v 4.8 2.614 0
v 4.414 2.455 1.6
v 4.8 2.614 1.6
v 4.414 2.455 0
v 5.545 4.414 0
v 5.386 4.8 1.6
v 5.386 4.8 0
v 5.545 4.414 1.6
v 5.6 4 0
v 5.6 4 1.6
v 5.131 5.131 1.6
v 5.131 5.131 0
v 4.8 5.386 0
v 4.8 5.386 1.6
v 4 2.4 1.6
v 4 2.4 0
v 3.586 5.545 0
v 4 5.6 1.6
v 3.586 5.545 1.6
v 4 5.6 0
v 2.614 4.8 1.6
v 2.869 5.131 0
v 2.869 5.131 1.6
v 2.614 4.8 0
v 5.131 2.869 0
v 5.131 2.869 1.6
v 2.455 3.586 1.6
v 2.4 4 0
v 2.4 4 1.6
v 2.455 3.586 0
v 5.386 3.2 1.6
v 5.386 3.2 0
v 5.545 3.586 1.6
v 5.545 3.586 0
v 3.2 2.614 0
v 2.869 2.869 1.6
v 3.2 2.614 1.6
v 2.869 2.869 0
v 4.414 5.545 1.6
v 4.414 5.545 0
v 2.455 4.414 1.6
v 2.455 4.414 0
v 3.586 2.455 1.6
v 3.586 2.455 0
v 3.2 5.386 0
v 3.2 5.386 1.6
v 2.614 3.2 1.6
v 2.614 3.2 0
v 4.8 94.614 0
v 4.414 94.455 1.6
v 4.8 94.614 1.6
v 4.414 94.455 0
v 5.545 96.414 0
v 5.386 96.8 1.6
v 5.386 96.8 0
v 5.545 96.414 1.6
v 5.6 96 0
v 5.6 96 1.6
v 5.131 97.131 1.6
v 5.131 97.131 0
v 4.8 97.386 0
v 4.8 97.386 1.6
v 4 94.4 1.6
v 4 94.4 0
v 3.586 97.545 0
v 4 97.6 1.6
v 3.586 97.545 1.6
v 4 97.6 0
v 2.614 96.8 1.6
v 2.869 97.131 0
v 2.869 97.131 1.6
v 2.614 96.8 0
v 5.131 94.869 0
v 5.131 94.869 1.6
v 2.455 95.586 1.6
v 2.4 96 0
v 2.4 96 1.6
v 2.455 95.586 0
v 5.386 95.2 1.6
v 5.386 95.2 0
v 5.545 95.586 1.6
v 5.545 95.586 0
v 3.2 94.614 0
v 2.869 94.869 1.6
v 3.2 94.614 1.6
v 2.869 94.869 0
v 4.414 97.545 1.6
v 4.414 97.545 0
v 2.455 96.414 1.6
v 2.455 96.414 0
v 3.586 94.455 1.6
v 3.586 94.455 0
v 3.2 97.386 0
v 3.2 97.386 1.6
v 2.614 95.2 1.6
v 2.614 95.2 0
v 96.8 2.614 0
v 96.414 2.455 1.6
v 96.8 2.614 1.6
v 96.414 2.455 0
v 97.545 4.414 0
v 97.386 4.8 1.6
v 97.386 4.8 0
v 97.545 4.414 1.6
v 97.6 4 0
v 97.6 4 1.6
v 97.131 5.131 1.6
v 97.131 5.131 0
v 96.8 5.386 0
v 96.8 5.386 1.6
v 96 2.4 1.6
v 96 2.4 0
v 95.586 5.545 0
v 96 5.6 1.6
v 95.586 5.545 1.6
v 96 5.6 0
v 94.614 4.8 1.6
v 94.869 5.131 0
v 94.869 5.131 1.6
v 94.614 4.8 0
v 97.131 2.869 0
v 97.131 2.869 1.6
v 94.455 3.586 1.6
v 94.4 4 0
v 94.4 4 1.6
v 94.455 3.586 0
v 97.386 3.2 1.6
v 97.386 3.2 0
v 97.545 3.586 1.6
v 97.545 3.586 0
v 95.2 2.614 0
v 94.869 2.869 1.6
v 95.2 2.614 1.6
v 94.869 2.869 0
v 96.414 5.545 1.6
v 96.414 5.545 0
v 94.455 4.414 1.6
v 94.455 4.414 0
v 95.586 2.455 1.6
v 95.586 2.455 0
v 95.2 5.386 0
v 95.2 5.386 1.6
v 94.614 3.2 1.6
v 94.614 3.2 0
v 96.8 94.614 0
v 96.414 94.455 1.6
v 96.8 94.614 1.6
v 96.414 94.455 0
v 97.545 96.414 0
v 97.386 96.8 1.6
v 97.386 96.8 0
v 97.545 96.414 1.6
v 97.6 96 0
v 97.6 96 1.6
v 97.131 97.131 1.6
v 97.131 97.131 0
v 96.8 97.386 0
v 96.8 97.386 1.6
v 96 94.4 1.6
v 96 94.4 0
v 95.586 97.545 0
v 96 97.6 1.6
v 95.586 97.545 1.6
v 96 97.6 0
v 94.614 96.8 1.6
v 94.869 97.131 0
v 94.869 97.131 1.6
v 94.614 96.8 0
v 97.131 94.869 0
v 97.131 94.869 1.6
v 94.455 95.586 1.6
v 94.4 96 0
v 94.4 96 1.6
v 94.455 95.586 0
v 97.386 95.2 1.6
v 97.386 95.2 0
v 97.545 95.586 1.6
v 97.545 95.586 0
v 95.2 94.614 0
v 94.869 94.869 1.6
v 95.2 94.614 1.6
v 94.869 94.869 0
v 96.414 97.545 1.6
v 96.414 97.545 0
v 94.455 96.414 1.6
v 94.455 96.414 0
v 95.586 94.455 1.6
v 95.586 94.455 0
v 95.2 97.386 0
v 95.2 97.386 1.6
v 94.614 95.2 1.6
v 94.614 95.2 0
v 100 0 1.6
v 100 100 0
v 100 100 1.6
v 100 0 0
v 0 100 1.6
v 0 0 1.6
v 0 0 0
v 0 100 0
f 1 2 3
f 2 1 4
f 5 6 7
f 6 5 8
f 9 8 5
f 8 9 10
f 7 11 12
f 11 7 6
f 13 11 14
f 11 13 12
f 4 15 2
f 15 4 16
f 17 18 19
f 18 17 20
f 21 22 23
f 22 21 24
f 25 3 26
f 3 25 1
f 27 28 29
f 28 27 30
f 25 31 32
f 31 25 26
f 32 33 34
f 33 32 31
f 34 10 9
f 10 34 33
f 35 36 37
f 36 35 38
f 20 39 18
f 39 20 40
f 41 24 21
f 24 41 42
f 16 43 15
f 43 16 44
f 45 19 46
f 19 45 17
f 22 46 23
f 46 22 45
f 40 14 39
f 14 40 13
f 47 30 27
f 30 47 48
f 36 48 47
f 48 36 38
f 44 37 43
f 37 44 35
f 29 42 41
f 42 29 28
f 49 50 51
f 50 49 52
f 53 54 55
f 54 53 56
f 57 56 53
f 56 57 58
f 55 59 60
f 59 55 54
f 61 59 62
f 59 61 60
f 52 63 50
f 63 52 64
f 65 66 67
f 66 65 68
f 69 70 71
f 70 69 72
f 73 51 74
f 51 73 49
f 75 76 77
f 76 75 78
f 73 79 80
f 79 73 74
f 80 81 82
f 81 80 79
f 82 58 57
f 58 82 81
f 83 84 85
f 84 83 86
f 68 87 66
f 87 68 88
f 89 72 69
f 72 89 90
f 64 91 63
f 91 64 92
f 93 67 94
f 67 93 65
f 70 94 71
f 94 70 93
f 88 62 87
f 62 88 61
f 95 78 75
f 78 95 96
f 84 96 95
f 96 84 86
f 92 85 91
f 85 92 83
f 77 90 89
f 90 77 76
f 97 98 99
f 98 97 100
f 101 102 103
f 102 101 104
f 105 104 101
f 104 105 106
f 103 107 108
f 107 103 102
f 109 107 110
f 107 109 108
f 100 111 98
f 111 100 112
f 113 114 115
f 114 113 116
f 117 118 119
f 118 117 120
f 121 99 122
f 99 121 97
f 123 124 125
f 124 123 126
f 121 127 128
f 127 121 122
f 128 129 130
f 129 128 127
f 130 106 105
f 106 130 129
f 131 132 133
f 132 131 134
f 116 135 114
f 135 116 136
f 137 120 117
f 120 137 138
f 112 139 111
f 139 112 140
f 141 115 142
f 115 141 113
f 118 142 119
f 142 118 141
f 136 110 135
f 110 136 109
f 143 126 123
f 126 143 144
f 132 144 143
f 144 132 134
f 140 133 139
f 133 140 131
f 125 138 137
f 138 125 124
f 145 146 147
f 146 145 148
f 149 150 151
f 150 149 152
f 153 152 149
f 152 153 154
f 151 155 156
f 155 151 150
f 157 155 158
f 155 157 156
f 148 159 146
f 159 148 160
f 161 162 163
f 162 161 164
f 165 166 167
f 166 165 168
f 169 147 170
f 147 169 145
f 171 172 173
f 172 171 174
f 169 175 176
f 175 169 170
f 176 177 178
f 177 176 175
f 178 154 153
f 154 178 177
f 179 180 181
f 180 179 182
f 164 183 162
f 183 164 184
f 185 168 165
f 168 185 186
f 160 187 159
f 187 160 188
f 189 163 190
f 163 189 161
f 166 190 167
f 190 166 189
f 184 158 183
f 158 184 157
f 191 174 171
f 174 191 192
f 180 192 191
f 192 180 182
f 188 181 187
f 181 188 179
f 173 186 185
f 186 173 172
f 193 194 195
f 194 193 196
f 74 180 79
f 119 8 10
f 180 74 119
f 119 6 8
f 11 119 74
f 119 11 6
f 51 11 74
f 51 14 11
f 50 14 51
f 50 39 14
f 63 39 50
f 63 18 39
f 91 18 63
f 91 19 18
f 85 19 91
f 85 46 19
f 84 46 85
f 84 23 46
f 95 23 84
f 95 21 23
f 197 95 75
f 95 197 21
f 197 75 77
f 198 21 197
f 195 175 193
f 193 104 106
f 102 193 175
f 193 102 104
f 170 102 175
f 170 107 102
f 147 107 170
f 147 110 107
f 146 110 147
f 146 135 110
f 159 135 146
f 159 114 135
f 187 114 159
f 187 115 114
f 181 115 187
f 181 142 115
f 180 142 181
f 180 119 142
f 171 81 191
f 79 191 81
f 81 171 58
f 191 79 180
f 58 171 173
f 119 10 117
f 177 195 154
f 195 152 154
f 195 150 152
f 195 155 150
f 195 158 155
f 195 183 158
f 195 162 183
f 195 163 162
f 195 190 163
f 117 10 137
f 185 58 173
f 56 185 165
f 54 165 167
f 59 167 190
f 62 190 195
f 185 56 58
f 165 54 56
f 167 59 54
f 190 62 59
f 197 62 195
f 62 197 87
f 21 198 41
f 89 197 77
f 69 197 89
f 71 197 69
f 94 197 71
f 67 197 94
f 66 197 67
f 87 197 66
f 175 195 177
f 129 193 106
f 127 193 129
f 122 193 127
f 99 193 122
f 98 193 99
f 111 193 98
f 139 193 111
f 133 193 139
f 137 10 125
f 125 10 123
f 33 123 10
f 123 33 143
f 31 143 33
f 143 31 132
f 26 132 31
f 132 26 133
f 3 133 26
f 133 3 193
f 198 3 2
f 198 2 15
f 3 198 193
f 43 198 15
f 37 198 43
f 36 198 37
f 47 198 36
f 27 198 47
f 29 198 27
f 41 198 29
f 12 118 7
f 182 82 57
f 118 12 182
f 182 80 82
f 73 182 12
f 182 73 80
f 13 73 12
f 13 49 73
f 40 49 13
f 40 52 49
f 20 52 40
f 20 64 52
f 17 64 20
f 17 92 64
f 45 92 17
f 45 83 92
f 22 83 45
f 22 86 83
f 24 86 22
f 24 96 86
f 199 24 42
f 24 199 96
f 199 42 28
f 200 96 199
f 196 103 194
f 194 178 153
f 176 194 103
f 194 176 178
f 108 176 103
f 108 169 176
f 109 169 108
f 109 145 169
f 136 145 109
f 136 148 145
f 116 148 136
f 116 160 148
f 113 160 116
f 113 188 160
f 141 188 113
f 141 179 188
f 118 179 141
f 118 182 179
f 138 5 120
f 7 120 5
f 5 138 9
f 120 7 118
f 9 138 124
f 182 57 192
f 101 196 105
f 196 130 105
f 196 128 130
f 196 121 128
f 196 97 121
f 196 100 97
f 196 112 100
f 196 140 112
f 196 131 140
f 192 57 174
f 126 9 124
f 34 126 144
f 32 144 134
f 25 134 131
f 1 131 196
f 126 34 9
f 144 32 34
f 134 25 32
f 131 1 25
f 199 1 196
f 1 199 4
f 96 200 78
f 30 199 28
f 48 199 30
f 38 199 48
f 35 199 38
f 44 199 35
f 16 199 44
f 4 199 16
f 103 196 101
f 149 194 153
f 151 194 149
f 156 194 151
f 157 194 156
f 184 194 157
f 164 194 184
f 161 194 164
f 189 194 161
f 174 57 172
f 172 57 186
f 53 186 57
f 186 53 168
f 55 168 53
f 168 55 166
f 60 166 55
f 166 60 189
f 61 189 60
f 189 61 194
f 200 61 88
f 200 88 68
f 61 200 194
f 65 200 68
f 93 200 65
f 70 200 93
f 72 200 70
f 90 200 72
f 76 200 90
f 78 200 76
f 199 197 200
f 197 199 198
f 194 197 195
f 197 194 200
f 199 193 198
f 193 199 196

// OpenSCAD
// =====================================================================
// ROBOT 2 (telepresence robot) - ALL PARAMETERS IN ONE PLACE
// Units: millimetres. Frame: origin on the floor under the centre of the base,
//   +x = front (the way the screen looks), +y = robot LEFT, +z = up.
// Every other .scad file does   include <robot2_params.scad>
// Values marked (V) were seen in a source, (A) are assumptions. See docs/mechanical-design.md.
// To change the robot: edit numbers HERE, then re-export the parts.
// =====================================================================
$fn = 48;
eps = 0.01;

// ---------------------------------------------------------------- BASE (round puck)
base_r      = 130;     // base radius -> 260 mm diameter
z_floor_b   = 12;      // floor underside above ground (ground clearance)
floor_t     = 3;       // floor thickness
z_floor_t   = z_floor_b + floor_t;   // 15 = top of floor
z_deck_b    = 68;      // deck underside = top of the tray rim (wheel top is 65)
deck_t      = 4;       // deck thickness
z_deck_t    = z_deck_b + deck_t;     // 72
cover_wall  = 2.0;     // cover skirt thickness
cover_top_t = 2.4;     // cover top plate thickness
z_cover_top = 105;     // top of cover
rim_t       = 2.0;     // tray rim wall

// split lines for printing the big discs in 4 pieces (any bed >= 180 mm)
cut_x = -40;           // front/rear split (rear pieces are x < cut_x)
cut_y = 0;             // left/right split
tab_clear = 0.25;      // dovetail clearance (female is bigger by this)

// ---------------------------------------------------------------- WHEELS, MOTORS, CASTER
wheel_d     = 65;      // PARAMETER: drive wheel diameter
wheel_w     = 26;      // wheel width (A)
wheel_r     = wheel_d/2;
axle_x      = 0;       // drive axle position
wheel_y     = 117;     // wheel centre plane (|y|) -> outer face at 130
wheel_gap   = 1.5;
motor_d     = 25;      // gearmotor body diameter (Pololu 25D / 25GA370 class)
motor_len   = 52;      // body incl. gearbox (V Pololu 25Dx52L)
motor_face_y= wheel_y - wheel_w/2 - 2.5 - 0.5; // gearbox face |y| = 101 (wall is behind it)
motor_shaft_d = 4;     // D-shaft (V Pololu 25D)
motor_shaft_len = 12;
well_wall_y = 101.2;   // inner wall of wheel well, |y| start
well_wall_t = 1.6;
caster_x    = 104;     // ball caster centre
caster_ball = 16;      // steel ball diameter (A: common 16 mm bearing ball)
caster_flange_d = 38;
caster_cup_d    = 28;
skid_pos    = [[95, 58], [95, -58], [-85, 85], [-85, -85]];   // 4 anti-tip skids (front-side and rear-side corners)
skid_gap    = 1.5;     // skid height above floor when level (was 4 mm; with 1.5 mm they touch after about 1 degree tilting backwards and about 2.7 degrees tilting forwards/sideways; they scrape door thresholds and thick carpet)

// ---------------------------------------------------------------- MOTHERBOARD (V: 100x100, holes 4/96 mm)
mb_size   = 100;
mb_hole   = 4;         // hole offset from board edge
mb_x0     = 14;        // robot x of the board's BOTTOM edge (servo plugs face front, +x)
mb_y0     = -88;       // robot y of the board's LEFT edge (power terminals face the robot's right)
mb_stand  = 6;         // standoff height above deck
mb_pcb_t  = 1.6;
mb_tall   = 20;        // tallest part above the PCB, bare (A: ESP32 on sockets ~15, PCA9685 module with its bare header strip ~19, DRV8833 on sockets ~17, 470 uF cap ~13). Servo PLUGS ARE NOT INCLUDED here: see PCA9685 SERVO-PLUG RELIEF below.
// board (bx,by) -> robot (x,y):  x = mb_x0 - by ;  y = mb_y0 + bx   (board turned 90 deg)
function mb_xy(bx,by) = [mb_x0 - by, mb_y0 + bx];

// ---------------------------------------------------------------- PCA9685 SERVO-PLUG RELIEF (window in the cover + printed plug_hood)
// A servo plug on the PCA9685 header is taller than the 3 mm of free space under the cover (cover underside 102.6, bare header top 98.7).
// With the assumed plug (14 mm) the plug top is at 106.2 and the wires need another 8 mm to bend away, so the cover gets a window and a hood.
// plug_relief = false: no window and no hood (use right-angle servo plugs, about 6 mm high, or MEASURE your plugs first).
plug_relief   = true;
plug_h        = 14;    // (A) height of a 3-pin servo plug housing on the 2.54 mm header (typical Dupont / JR size). MEASURE YOUR PLUG, then change this number.
plug_bend     = 8;     // (A) extra room above the plug so the wires can turn sideways
hdr_plastic_h = 2.5;   // (A) black plastic base of the header (the plug sits on it)
pca_top_h     = 10.1;  // PCA9685 board top above the motherboard top face (from robot2_ghosts.scad, mb_pca)
mb_top_z      = z_deck_t + mb_stand + mb_pcb_t;                 // 79.6 top face of the motherboard
plug_top_z    = mb_top_z + pca_top_h + hdr_plastic_h + plug_h;  // 106.2 top of the plug housings
cover_in_z    = z_cover_top - cover_top_t;                      // 102.6 underside of the cover top plate
relief_h      = max(0, ceil(plug_top_z + plug_bend - cover_in_z));   // 12 mm of extra headroom above the cover underside (computed)
// window (robot frame): the header strip (board bx 11..74, by 2..8) plus 3 mm either side, and 15 mm toward the mast for the wires
relief_p0 = mb_xy(8, 13);     // corner 1 = [1, -80]
relief_p1 = mb_xy(77, -10);   // corner 2 = [24, -11]
relief_cx = (relief_p0[0] + relief_p1[0]) / 2;   relief_cy = (relief_p0[1] + relief_p1[1]) / 2;     // window centre = [12.5, -45.5]
relief_wx = abs(relief_p1[0] - relief_p0[0]);    relief_wy = abs(relief_p1[1] - relief_p0[1]);      // window size = 23 x 69
hood_wall = 2;  hood_top_t = 2;  hood_fl_w = 4;  hood_fl_t = 1.6;     // plug_hood (base.scad): wall, top thickness, flange width, flange thickness
hood_h_in = relief_h - cover_top_t;                                    // 9.6 inside height above the cover top face
hood_top_z = z_cover_top + hood_h_in + hood_top_t;                     // 116.6 top of the hood (outside), robot frame

// ---------------------------------------------------------------- COVER TOP: BUTTON, SPEAKER, SPEAKERPHONE  (R23, open item C5; sizes from docs/peripherals.md 5.6)
// Positions are on the cover top, robot frame. Each place is kept clear of the mast cut-out (x 38..86, |y| < 30), the plug hood (x -5..30, y -86..-5), the cover posts, the vents and each other.
// The cover prints top face DOWN, so the speaker pocket (a ring that hangs under the top plate) stands up from the bed and needs no support.
btn_hole_d = 30;                 // call / STOP button: round hole in the cover top (A: MEASURE your button; many 30 mm arcade buttons need a 28 to 30 mm hole and a plate of 2 to 3 mm)
btn_pos    = [62, 60];           // robot LEFT of the mast. Under it: 30 mm free down to the deck (the button needs about 25 mm), the foot plate ends at |y| = 42, the button body starts at |y| = 46
btn_depth  = 25;                 // (A, peripherals 5.6) free depth needed behind the panel
btn_body_d = 28;  btn_cap_d = 33;  btn_cap_h = 9;   // (A) ghost only: body behind the panel, cap above the panel
spk_place    = true;             // route B speaker place (grille + pocket) in the cover top. false = plain cover top
spk_pos      = [56, -60];        // robot RIGHT of the mast. The speaker faces UP; the microphone is in the head, 0.4 m higher
spk_grille_d = 36;               // grille opening about 36 mm across (19 holes of 3.5 mm inside it)
spk_pocket_d = 42;               // pocket about 42 mm across (inside)
spk_pocket_h = 15;               // pocket depth under the plate. (A: MEASURE the real speaker depth.)
spk_wall     = 1.6;              // pocket wall thickness
spk_body_h   = 12;               // (A) ghost only: speaker thickness
spkA_pos = [-14, 59];  spkA_d = 115;  spkA_h = 35;   // route A: flat spot on the cover top for a USB speakerphone. 115 mm is the biggest circle that stays free (mast, hood, posts, vents, button, speaker). (A: its real size, 100 to 125 mm, and weight, 350 g, are not verified.) Only kept free, nothing is cut. Ghost: ghost_speakerphone().

// ---------------------------------------------------------------- SBC (generic Raspberry-Pi sized envelope)
sbc_l = 85;  sbc_w = 56;  sbc_stand = 5;
sbc_hole_dx = 58; sbc_hole_dy = 49; sbc_hole_off = 3.5;   // (V-ish: Pi family 58 x 49, M2.5)
sbc_hole_d  = 2.2;                  // M2.5 self-tapping
sbc_tall    = 17;                   // USB-A stack height above PCB (A)
sbc_x0 = 13;  sbc_y0 = 92;          // robot x,y of the board's lower-left corner (board rotated 180 deg)
// SBC (u,v) -> robot (x,y):  x = sbc_x0 - u ; y = sbc_y0 - v   (USB ports at the rear, HDMI/power edge faces +y)
function sbc_xy(u,v) = [sbc_x0 - u, sbc_y0 - v];

// ---------------------------------------------------------------- MAST
mast_x    = 62;        // mast axis x (robot frame), y = 0
mast_w    = 56;        // outer width  (along y)
mast_d    = 44;        // outer depth  (along x)
mast_r    = 10;        // corner radius
mast_wall = 3;
mast_in_w = mast_w - 2*mast_wall;   // 50
mast_in_d = mast_d - 2*mast_wall;   // 38
foot_w = 84; foot_d = 70; foot_t = 4;  // foot plate on the deck
foot_sock_h = 18;      // socket height (shell slides in)
foot_bolt_dx = 60; foot_bolt_dy = 46;   // 4 x M4 (or M3) holes to the deck
foot_pad_h = 3;                         // 4 pads on the deck lift the foot plate (M4 inserts sit in the pads)
z_mast_bot  = z_deck_t + foot_pad_h + foot_t;   // shell bottom (79)
// head geometry drives the mast height (see head parameters below)

// ---------------------------------------------------------------- PAN / TILT  (== INTERFACE, see pan_tilt_interface.scad)
// MG996R class servo (A: most values from shop listings, see doc)
srv_l = 40.7; srv_w = 19.7;     // (V) case footprint
srv_case_h = 36.5;              // (A) case height without the output spline
srv_total_h = 42.9;             // (V) incl. output spline
srv_ear_len = 54;               // (A) length over the mounting ears
srv_ear_below_top = 10;         // (A) ear plane below the output face
srv_shaft_off = 10.2;           // (A) output shaft centre from the end of the case
srv_ear_hole_dx = 49.5;         // (A) mounting hole spacing along the length
srv_ear_hole_dy = 9.5;          // (V kitronik) across the width
srv_ear_hole_d  = 4.2;
horn_d = 20;  horn_t = 3;  horn_pcd = 14;  horn_hole = 3.2;   // (V) 25T aluminium disc horn: 20 mm, 4 x M3 on 14 mm
// vertical neck stack above the mast-top plate
neck_ped_h  = 0;                // (no raised pedestal: the plate top is the horn attach face; plate is flat so it prints face-down)
srv_spline_above_case = srv_total_h - srv_case_h;  // 6.4
// turntable top = ear plane. distance ear plane -> horn bottom:
srv_ear_to_horn_bottom = srv_ear_below_top + srv_spline_above_case;           // 16.4 (horn is fixed to the pedestal, flush with the spline end)
tt_top_above_plate = neck_ped_h + srv_ear_to_horn_bottom;                      // 16.4 (neck_ped_h is 0)
tt_t   = 4;                     // turntable plate thickness
skirt_r = 44;                   // turntable skirt radius (rotating, rides on PTFE tape ring)
skirt_t = 2;
pan_range_deg = 180;            // stock MG996R travel +-90 (A). INTERIM SOFTWARE PAN LIMIT = +-pan_limit_interim (see CABLE PATH below), normal limit +-80 only after the cable loop is proven in Stage 6. The 270-degree servo is optional and only needed for the 120-degree case.
neck_plate_t = 9;               // mast-top (interface) plate thickness
// interface 1: where the pan/tilt module bolts to the mast-top plate (owner's design replaces mine here)
if1_bolt_dx = 60; if1_bolt_dy = 40; if1_bolt_d = 4.4;   // 4 x M4 pattern (A, default)
// interface 2: where the head is held by the tilt output (rear pad on the head lid)
if2_bolt_dx = 60; if2_bolt_dy = 40; if2_bolt_d = 3.4;   // 4 x M3 pattern on the head back (A, default)
// TILT SIGN CONVENTION (same in every file and in the serial protocol): 0 = level, POSITIVE = the head looks UP, NEGATIVE = looks DOWN.
tilt_range = [-25, 35];         // degrees: [-25 = 25 degrees down, +35 = 35 degrees up]

// ---------------------------------------------------------------- CABLE PATH THROUGH THE NECK  (finding 20, decision R21: OPEN DESIGN ITEM)
// The bundle (HDMI + USB + power + servo leads) goes up the mast, through the neck plate (fixed), through the turntable (turns with the head), then into the head.
// The plate and the turntable are only tt_top_above_plate - tt_t = 12.4 mm apart and the bundle sits about 19 mm off the pan axis. So when the head pans by an angle,
// the turntable slot moves sideways by 2 x 19 x sin(angle / 2) (9.8 mm at 30 degrees, 26.9 mm at 90 degrees) and turns by the same angle. The old 38 x 12.5 slot in the plate
// (same place as the turntable slot) could not follow: a straight 25 x 12 bundle turned by 30 degrees had 30 percent of its section outside the plate slot, by 90 degrees all of it.
// WHAT IS DONE (no height is changed):
//   - The plate opening is now the swept envelope of the bundle for +-pan_cable_deg (a kidney shape, 762 mm2 against 475 mm2 before, clipped to the inside of the mast socket), see neck_plate().
//   - The turntable slot is 38 x 14 (was 38 x 12.5) so that the 12 mm bundle has 1 mm of play on each side.
//   - The bundle is NOT tied at the neck plate any more (doc 6.3 said so). It is tied low in the mast (self-adhesive tie mount on a shell or on the deck) and inside the head, so
//     the pan twist is spread over about 240 mm of free cable. The tie points are NOT modelled (use adhesive tie mounts). Do not tie the bundle to the plate or to the turntable.
//   - The HDMI cable is threaded from the HEAD end: its big 21 x 11 mm plug stays in the head and never has to pass the neck.
// WHAT WAS REJECTED: a service loop in the gap between plate and turntable. An S-bend of a 12 mm bundle (bend radius about 30 mm, ASSUMED) needs about 33 mm of height for +-30 degrees
//   and about 50 mm for +-90 degrees, plus about 10 mm for the two clamps: a gap of about 43 mm or 60 mm against 12.4 mm now, i.e. +31 mm or +48 mm. That is more than the 20 mm limit
//   of decision R21, so the heights stay as they are.
// INTERIM RULE: pan soft limit +-30 degrees (pan_limit_interim) until the loop is proven with the REAL bundle in Stage 6. Test result (straight, stiff 25 x 12 bundle turned with the head, intersection volumes): it fits the new plate
//   opening up to about +-28 degrees (13 mm3 of corner at +-30; the 21 x 11 HDMI plug fits at +-30 with 0), but it touches the rounded corners of the mast hole under the plate from about +-5 degrees (11 mm2 of its 300 mm2
//   section at +-15, 31 mm2 = 10 percent, a 4 mm corner, at +-30). So a soft bundle has to squeeze one corner by up to 4 mm at +-30. If the real bundle is stiff, lower the limit to +-20 degrees.
// OPEN ITEM: +-90 degrees needs the cable on the pan axis (hollow pan shaft, slip ring) or a taller neck. Both change the heights by more than 20 mm. Not designed yet.
bundle_w = 25;  bundle_t = 12;         // (A) cable bundle section: 25 x 12 mm (docs/mechanical-design.md 6.2)
hdmi_plug_w = 21;  hdmi_plug_t = 11;  hdmi_plug_l = 40;   // (A) full-size HDMI plug 21 x 11 mm, about 40 mm long (only a test ghost)
bundle_cy = -19;                       // bundle centre, y (x = 0), pan-axis frame: beside the pan servo (case edge at |y| 10.15) and inside the yoke bar edge (|y| 26)
cable_clr = 1.0;                       // play around the bundle in the openings
pan_limit_interim = 30;                // INTERIM software pan limit, +- degrees (R21)
pan_cable_deg = pan_limit_interim;     // the plate opening is cut for the bundle swept over +-pan_cable_deg
cable_sweep_step = 5;                  // degrees between the rectangles of the sweep (0.03 mm error at the corners)
tt_slot_x0 = -19;  tt_slot_x1 = 19;  tt_slot_y0 = -26;  tt_slot_y1 = -12;   // turntable slot (turns with the head): 38 x 14
if1_slot_w = bundle_w + 2 * cable_clr; if1_slot_h = bundle_t + 2 * cable_clr;   // INTERFACE 1 cable opening in the plate AT PAN 0 (27 x 14). The real opening is wider: the swept envelope for +-pan_cable_deg (neck_plate). Was 30 x 14, never used.

// ---------------------------------------------------------------- HEAD (7 inch default)
scr_w = 165; scr_h = 107; scr_t = 10;     // (A) 165 x 100 assumed in the task; Waveshare wiki says 164.9 x 106.96 x 8 (V, search summary only: re-check the page) -> pocket takes both
scr_vis_w = 156; scr_vis_h = 88;          // window in the bezel (V, search summary only: active area 154.2 x 85.9)
scr_vis_dz = 0;                           // window offset up: ASSUMED (A). The real active area is probably NOT centred on the board. Cut a paper template of the real screen (outline and picture area) before you print head_shell, then change this number.
scr_clear = 1.2;                          // (A) play around the screen in the pocket: 0.6 mm per side (was 0.6 mm in total: too tight for printed PETG). Pocket = 166.2 x 108.2 mm.
head_wall = 4.2;
head_r    = 8.5;
head_w = scr_w + scr_clear + 2*head_wall;   // 174.6
head_h = scr_h + scr_clear + 2*head_wall;   // 116.6
head_d = 44;
lip_t  = 2;                                  // front plate in front of the screen
head_axis_y = -3;                            // tilt axis depth (head centre = 0, front = +22)
head_axis_z = 8;                             // tilt axis above head centre
lid_t = 2.4;
cam_w = 60; cam_d = 30; cam_h = 28;          // (A) webcam body, SC-012-SN259 unknown: send real size
cam_lens_d = 16; cam_lens_dz = 0;
brow_extra = 8;                              // each side of the camera: extra brow width for the camera-live LED (R23); was 0 (brow was 68 wide)
brow_w = cam_w + 8 + 2 * brow_extra; brow_h = cam_h + 6;      // brow box outside size (84 x 34)
brow_front_t = 3;
cam_gap = 1.5;                               // (A) air / foam between the brow front wall and the webcam body. Must be at least 1.2 mm so that the 2 mm lens bump stays behind the slide cover.
// R23 (open item C5): camera-live LED hole and camera slide cover, in the brow front wall. Sizes from docs/peripherals.md 5.6.
led_d = 5.2;                                 // (A) hole for a 5 mm LED (the LED flange, 5.8 mm, sits behind the wall). MEASURE YOUR LED.
led_y = -(cam_w / 2 + 4);                    // LED hole centre y, head frame: 4 mm beyond the webcam body edge, robot RIGHT side (-y). Same height as the lens.
cov_t = 1.0;                                 // (A) slide cover thickness: printed 1 mm (print part cam_cover) or a thin plastic card
cov_play = 0.4;                              // total play in the cover slot (thickness)
cov_skin = (brow_front_t - cov_t - cov_play) / 2;   // 0.8 mm of wall in front of and behind the slot (two perimeters)
cov_slot_h = cam_lens_d + 6;                 // slot height = lens window + 6 = 22 mm
cov_y0 = -(cam_lens_d / 2 + 6);              // closed end of the slot, y: 6 mm beyond the lens window edge (the slot is open at the +y side of the brow)
cov_h = cov_slot_h - 2;                      // cover height 20 mm
cov_len = 62;                                // cover length: shuts the lens window when pushed in; its end sticks out cov_len + cov_y0 - brow_w / 2 = 6 mm of the brow for the finger
cov_pull = cam_lens_d / 2 - cov_y0 + 2;      // 24 mm: how far to pull the cover out. The cover end must pass the far edge of the lens window (22 mm), plus 2 mm margin. Pulling it further (or out of the slot) is fine.
speaker_d = 40;                              // (A) 40 mm round speaker (route B). It goes into the COVER (see COVER TOP), NOT into the head lid. The 9-hole grille in the lid is only air.
head_boss_t = 3;                             // inner boss that the servo ears press on
yoke_gap = srv_ear_below_top + srv_spline_above_case - head_wall - head_boss_t;   // 9.2: head wall to yoke arm; the horn attach face is the arm's inner face
yoke_arm_t = 7;
yoke_arm_w = 46;                             // depth of yoke arm / bar (along robot x)
yoke_bar_t = 6;

// ---------------------------------------------------------------- HEIGHTS (decided)
head_axis_h = 420;                           // tilt axis above floor
neck_axis_above_tt = ceil((srv_case_h - srv_ear_below_top)                                   // tilt axis above the turntable top: pan servo body height above the ears
    + sqrt(pow(head_d / 2 + abs(head_axis_y), 2) + pow(head_h / 2 + head_axis_z, 2)) + 4);   // + swept radius of the head corner + 4 mm = 102 for the 7 inch head

z_tt_top    = head_axis_h - neck_axis_above_tt;       // 318 turntable top
z_neck_plate_top = z_tt_top - tt_top_above_plate;     // 301.6 top of mast-top plate
z_neck_plate_bot = z_neck_plate_top - neck_plate_t;
z_mast_top  = z_neck_plate_bot;                       // shell top
neck_sock_h = 16;
mast_split_z = (z_mast_bot + z_mast_top)/2;           // junction of the two shell segments
collar_h    = 40;

// ---------------------------------------------------------------- SENSORS
sonar_ang   = 28;      // deg left/right of the front
sonar_r     = 126;
sonar_z     = 45;
sonar_l=45; sonar_w=20; sonar_t=15; sonar_hole=16.6; sonar_pitch=26;   // (V mostly: 45x20x15, 16 mm transducers; pitch A)
cliff_ang   = 52;      // cliff sensors: degrees left/right of the front. KEPT after a search for a place nearer the caster (x 105..125):
cliff_r     = 112;     //   centre radius -> x = 68.96, y = +-88.3. That is 35 mm behind the caster (x 104) and about 43 mm ahead of the balance point (x 25.9).
                       //   A 30 x 14 mm module has no room ahead of about x = 77: caster flange (to x 123), XL4016 bays (to x 85), columns, sonar cheeks.
                       //   A much smaller module (about 16 x 10 mm) might fit near x = 115, y = +-22 (flat 2D search only, not checked in 3D). So the cliff margin is SHORT: see docs/mechanical-design.md.

// ---------------------------------------------------------------- OPTIONAL BUMPER (NOT in the first build)
// A low arc around the front (3 printed pieces, glued) with two arms that go through slots in the rim and push two lever micro switches.
// bumper_slots = true: the tray has the two arm slots and the two switch pads (costs nothing, saves a reprint if you add the bumper later).
// bumper_slots = false: closed rim, no pads. The bumper pieces themselves are printed only if you want them (print_parts.scad: bumper_R, bumper_C, bumper_L).
bumper_slots = true;
bump_ang   = 66;       // arm direction, degrees left/right of the front. At 38 deg the arm crossed the sonar cheek (sonars are at +-28 deg); between about 44 and 64 deg the arm or the switch pad hits the cliff modules (52 deg).
bump_z0    = 18;       // bottom of the arc AND of the arms: both lie flat on the print bed, so no supports are needed
bump_arc_h = 16;       // arc height (z 18 to 34, below the sonar holes which start at z 36.7)
bump_arc_t = 4;        // arc wall thickness
bump_arm_w = 12;  bump_arm_h = 6;
bump_arm_r0 = 124;     // radius of the inner end of the arm (the arm sticks out 9 mm beyond this, through the rim). Moved outward so the 20 mm switch clears the wheel-well wall and the cliff module (about 2.5 mm each).
bump_travel = 3.5;     // (A) how far the arc is pushed in a front hit. The arm slots are widened so the arms can slide sideways by travel x sin(ang).
bump_slot_w = bump_arm_w + 2 * (bump_travel * sin(bump_ang) + 0.5);     // 19.4 at 66 deg
bump_sw_l = 20;  bump_sw_w = 10.2;  bump_sw_t = 6.4;   // (A) lever micro switch (KW12-3 type) lying flat: 20 x 10.2 x 6.4 mm, mounting holes 9.5 mm apart along the 20 mm side; the arm pushes the lever
bump_sw_pitch = 9.5;
bump_pad_h = bump_z0 + bump_arm_h / 2 - bump_sw_t / 2 - z_floor_t;     // 2.8: pad height so that the switch lever is level with the middle of the arm
bump_pad_w = 14;  bump_pad_l = 12;                                      // pad: 14 mm along the arc x 12 mm radial (the 20 mm switch overhangs it a little)

// ---------------------------------------------------------------- BAYS (positions of bought parts in the base, robot frame)
batt_x = -2;  batt_y = 0;   batt_l = 77; batt_w = 40; batt_h = 21;      // 2 x 18650 holder (A)
xl_pos  = [[62,-36],[62,36]];  xl_l = 46; xl_w = 60; xl_h = 22;         // 2 x XL4016 (A) long side along y
mini_pos = [[-96,-56],[-96,56]];  mini_l = 23; mini_w = 17; mini_h = 8;   // fixed bucks (A)
fuse_pos = [[-61,-48],[-61,-30],[-61,-12],[-61,6],[-61,24]]; fuse_l = 30; fuse_w = 16; fuse_h = 12;   // 5 inline blade-fuse holders (A)
wago_pos = [[-96,-30],[-96,30]]; wago_l = 40; wago_w = 17; wago_h = 17;  // 2 lever connectors (A)
chg_pos  = [-102, 0]; chg_l = 45; chg_w = 26; chg_h = 10;               // USB-C charger board, socket faces rear (A)
sw_pos_y = 50;  sw_d = 19;                                              // main switch through the rear wall

// ---------------------------------------------------------------- columns and posts
col_pos  = [[28,48],[28,-48],[-70,64],[-70,-64],[98,48],[98,-48]];   // tray -> deck columns (M3 insert on top). Rear pair moved from (-70,+-35) to (-70,+-64): the old ones stood inside the fuse holders.
cpost_pos = [[85,70],[85,-70],[-100,40],[-100,-40]];                 // deck -> cover posts
col_d = 10; post_d = 9;

skirt_h = tt_top_above_plate - tt_t - 0.4;   // turntable skirt height (12)

// ---------------------------------------------------------------- small helpers shared by all files
module ring(r1, r2, h) { difference() { cylinder(r = r1, h = h); translate([0, 0, -1]) cylinder(r = r2, h = h + 2); } }
module hexnut_pocket(af = 5.7, h = 2.6) { cylinder(d = af / cos(30), h = h, $fn = 6); }   // M3 nut is 5.5 AF, +0.2
module insert_hole(d = 4.0, h = 6.5) { cylinder(d = d, h = h, $fn = 20); }              // M3 heat-set insert hole
module rrect2(w, d, r) { offset(r) square([w - 2 * r, d - 2 * r], center = true); }     // 2D rounded rectangle, w along x
// profile drawn in (y,z) and extruded along x from x0 to x1:
module ex(x0, x1) { translate([x0, 0, 0]) rotate([90, 0, 90]) linear_extrude(height = x1 - x0) children(); }

// ---------------------------------------------------------------- demo shape (only when THIS file is opened or exported on its own)
// A 100 x 100 mm plate with the 4 motherboard holes (M3 at 4 mm from the edges): print it to check the hole pattern on your printer.
module params_demo() {
    difference() {
        cube([mb_size, mb_size, mb_pcb_t]);
        for (hx = [mb_hole, mb_size - mb_hole], hy = [mb_hole, mb_size - mb_hole]) translate([hx, hy, -1]) cylinder(d = 3.2, h = 5, $fn = 24);
    }
}
if (is_undef(_robot2_lib)) params_demo();
